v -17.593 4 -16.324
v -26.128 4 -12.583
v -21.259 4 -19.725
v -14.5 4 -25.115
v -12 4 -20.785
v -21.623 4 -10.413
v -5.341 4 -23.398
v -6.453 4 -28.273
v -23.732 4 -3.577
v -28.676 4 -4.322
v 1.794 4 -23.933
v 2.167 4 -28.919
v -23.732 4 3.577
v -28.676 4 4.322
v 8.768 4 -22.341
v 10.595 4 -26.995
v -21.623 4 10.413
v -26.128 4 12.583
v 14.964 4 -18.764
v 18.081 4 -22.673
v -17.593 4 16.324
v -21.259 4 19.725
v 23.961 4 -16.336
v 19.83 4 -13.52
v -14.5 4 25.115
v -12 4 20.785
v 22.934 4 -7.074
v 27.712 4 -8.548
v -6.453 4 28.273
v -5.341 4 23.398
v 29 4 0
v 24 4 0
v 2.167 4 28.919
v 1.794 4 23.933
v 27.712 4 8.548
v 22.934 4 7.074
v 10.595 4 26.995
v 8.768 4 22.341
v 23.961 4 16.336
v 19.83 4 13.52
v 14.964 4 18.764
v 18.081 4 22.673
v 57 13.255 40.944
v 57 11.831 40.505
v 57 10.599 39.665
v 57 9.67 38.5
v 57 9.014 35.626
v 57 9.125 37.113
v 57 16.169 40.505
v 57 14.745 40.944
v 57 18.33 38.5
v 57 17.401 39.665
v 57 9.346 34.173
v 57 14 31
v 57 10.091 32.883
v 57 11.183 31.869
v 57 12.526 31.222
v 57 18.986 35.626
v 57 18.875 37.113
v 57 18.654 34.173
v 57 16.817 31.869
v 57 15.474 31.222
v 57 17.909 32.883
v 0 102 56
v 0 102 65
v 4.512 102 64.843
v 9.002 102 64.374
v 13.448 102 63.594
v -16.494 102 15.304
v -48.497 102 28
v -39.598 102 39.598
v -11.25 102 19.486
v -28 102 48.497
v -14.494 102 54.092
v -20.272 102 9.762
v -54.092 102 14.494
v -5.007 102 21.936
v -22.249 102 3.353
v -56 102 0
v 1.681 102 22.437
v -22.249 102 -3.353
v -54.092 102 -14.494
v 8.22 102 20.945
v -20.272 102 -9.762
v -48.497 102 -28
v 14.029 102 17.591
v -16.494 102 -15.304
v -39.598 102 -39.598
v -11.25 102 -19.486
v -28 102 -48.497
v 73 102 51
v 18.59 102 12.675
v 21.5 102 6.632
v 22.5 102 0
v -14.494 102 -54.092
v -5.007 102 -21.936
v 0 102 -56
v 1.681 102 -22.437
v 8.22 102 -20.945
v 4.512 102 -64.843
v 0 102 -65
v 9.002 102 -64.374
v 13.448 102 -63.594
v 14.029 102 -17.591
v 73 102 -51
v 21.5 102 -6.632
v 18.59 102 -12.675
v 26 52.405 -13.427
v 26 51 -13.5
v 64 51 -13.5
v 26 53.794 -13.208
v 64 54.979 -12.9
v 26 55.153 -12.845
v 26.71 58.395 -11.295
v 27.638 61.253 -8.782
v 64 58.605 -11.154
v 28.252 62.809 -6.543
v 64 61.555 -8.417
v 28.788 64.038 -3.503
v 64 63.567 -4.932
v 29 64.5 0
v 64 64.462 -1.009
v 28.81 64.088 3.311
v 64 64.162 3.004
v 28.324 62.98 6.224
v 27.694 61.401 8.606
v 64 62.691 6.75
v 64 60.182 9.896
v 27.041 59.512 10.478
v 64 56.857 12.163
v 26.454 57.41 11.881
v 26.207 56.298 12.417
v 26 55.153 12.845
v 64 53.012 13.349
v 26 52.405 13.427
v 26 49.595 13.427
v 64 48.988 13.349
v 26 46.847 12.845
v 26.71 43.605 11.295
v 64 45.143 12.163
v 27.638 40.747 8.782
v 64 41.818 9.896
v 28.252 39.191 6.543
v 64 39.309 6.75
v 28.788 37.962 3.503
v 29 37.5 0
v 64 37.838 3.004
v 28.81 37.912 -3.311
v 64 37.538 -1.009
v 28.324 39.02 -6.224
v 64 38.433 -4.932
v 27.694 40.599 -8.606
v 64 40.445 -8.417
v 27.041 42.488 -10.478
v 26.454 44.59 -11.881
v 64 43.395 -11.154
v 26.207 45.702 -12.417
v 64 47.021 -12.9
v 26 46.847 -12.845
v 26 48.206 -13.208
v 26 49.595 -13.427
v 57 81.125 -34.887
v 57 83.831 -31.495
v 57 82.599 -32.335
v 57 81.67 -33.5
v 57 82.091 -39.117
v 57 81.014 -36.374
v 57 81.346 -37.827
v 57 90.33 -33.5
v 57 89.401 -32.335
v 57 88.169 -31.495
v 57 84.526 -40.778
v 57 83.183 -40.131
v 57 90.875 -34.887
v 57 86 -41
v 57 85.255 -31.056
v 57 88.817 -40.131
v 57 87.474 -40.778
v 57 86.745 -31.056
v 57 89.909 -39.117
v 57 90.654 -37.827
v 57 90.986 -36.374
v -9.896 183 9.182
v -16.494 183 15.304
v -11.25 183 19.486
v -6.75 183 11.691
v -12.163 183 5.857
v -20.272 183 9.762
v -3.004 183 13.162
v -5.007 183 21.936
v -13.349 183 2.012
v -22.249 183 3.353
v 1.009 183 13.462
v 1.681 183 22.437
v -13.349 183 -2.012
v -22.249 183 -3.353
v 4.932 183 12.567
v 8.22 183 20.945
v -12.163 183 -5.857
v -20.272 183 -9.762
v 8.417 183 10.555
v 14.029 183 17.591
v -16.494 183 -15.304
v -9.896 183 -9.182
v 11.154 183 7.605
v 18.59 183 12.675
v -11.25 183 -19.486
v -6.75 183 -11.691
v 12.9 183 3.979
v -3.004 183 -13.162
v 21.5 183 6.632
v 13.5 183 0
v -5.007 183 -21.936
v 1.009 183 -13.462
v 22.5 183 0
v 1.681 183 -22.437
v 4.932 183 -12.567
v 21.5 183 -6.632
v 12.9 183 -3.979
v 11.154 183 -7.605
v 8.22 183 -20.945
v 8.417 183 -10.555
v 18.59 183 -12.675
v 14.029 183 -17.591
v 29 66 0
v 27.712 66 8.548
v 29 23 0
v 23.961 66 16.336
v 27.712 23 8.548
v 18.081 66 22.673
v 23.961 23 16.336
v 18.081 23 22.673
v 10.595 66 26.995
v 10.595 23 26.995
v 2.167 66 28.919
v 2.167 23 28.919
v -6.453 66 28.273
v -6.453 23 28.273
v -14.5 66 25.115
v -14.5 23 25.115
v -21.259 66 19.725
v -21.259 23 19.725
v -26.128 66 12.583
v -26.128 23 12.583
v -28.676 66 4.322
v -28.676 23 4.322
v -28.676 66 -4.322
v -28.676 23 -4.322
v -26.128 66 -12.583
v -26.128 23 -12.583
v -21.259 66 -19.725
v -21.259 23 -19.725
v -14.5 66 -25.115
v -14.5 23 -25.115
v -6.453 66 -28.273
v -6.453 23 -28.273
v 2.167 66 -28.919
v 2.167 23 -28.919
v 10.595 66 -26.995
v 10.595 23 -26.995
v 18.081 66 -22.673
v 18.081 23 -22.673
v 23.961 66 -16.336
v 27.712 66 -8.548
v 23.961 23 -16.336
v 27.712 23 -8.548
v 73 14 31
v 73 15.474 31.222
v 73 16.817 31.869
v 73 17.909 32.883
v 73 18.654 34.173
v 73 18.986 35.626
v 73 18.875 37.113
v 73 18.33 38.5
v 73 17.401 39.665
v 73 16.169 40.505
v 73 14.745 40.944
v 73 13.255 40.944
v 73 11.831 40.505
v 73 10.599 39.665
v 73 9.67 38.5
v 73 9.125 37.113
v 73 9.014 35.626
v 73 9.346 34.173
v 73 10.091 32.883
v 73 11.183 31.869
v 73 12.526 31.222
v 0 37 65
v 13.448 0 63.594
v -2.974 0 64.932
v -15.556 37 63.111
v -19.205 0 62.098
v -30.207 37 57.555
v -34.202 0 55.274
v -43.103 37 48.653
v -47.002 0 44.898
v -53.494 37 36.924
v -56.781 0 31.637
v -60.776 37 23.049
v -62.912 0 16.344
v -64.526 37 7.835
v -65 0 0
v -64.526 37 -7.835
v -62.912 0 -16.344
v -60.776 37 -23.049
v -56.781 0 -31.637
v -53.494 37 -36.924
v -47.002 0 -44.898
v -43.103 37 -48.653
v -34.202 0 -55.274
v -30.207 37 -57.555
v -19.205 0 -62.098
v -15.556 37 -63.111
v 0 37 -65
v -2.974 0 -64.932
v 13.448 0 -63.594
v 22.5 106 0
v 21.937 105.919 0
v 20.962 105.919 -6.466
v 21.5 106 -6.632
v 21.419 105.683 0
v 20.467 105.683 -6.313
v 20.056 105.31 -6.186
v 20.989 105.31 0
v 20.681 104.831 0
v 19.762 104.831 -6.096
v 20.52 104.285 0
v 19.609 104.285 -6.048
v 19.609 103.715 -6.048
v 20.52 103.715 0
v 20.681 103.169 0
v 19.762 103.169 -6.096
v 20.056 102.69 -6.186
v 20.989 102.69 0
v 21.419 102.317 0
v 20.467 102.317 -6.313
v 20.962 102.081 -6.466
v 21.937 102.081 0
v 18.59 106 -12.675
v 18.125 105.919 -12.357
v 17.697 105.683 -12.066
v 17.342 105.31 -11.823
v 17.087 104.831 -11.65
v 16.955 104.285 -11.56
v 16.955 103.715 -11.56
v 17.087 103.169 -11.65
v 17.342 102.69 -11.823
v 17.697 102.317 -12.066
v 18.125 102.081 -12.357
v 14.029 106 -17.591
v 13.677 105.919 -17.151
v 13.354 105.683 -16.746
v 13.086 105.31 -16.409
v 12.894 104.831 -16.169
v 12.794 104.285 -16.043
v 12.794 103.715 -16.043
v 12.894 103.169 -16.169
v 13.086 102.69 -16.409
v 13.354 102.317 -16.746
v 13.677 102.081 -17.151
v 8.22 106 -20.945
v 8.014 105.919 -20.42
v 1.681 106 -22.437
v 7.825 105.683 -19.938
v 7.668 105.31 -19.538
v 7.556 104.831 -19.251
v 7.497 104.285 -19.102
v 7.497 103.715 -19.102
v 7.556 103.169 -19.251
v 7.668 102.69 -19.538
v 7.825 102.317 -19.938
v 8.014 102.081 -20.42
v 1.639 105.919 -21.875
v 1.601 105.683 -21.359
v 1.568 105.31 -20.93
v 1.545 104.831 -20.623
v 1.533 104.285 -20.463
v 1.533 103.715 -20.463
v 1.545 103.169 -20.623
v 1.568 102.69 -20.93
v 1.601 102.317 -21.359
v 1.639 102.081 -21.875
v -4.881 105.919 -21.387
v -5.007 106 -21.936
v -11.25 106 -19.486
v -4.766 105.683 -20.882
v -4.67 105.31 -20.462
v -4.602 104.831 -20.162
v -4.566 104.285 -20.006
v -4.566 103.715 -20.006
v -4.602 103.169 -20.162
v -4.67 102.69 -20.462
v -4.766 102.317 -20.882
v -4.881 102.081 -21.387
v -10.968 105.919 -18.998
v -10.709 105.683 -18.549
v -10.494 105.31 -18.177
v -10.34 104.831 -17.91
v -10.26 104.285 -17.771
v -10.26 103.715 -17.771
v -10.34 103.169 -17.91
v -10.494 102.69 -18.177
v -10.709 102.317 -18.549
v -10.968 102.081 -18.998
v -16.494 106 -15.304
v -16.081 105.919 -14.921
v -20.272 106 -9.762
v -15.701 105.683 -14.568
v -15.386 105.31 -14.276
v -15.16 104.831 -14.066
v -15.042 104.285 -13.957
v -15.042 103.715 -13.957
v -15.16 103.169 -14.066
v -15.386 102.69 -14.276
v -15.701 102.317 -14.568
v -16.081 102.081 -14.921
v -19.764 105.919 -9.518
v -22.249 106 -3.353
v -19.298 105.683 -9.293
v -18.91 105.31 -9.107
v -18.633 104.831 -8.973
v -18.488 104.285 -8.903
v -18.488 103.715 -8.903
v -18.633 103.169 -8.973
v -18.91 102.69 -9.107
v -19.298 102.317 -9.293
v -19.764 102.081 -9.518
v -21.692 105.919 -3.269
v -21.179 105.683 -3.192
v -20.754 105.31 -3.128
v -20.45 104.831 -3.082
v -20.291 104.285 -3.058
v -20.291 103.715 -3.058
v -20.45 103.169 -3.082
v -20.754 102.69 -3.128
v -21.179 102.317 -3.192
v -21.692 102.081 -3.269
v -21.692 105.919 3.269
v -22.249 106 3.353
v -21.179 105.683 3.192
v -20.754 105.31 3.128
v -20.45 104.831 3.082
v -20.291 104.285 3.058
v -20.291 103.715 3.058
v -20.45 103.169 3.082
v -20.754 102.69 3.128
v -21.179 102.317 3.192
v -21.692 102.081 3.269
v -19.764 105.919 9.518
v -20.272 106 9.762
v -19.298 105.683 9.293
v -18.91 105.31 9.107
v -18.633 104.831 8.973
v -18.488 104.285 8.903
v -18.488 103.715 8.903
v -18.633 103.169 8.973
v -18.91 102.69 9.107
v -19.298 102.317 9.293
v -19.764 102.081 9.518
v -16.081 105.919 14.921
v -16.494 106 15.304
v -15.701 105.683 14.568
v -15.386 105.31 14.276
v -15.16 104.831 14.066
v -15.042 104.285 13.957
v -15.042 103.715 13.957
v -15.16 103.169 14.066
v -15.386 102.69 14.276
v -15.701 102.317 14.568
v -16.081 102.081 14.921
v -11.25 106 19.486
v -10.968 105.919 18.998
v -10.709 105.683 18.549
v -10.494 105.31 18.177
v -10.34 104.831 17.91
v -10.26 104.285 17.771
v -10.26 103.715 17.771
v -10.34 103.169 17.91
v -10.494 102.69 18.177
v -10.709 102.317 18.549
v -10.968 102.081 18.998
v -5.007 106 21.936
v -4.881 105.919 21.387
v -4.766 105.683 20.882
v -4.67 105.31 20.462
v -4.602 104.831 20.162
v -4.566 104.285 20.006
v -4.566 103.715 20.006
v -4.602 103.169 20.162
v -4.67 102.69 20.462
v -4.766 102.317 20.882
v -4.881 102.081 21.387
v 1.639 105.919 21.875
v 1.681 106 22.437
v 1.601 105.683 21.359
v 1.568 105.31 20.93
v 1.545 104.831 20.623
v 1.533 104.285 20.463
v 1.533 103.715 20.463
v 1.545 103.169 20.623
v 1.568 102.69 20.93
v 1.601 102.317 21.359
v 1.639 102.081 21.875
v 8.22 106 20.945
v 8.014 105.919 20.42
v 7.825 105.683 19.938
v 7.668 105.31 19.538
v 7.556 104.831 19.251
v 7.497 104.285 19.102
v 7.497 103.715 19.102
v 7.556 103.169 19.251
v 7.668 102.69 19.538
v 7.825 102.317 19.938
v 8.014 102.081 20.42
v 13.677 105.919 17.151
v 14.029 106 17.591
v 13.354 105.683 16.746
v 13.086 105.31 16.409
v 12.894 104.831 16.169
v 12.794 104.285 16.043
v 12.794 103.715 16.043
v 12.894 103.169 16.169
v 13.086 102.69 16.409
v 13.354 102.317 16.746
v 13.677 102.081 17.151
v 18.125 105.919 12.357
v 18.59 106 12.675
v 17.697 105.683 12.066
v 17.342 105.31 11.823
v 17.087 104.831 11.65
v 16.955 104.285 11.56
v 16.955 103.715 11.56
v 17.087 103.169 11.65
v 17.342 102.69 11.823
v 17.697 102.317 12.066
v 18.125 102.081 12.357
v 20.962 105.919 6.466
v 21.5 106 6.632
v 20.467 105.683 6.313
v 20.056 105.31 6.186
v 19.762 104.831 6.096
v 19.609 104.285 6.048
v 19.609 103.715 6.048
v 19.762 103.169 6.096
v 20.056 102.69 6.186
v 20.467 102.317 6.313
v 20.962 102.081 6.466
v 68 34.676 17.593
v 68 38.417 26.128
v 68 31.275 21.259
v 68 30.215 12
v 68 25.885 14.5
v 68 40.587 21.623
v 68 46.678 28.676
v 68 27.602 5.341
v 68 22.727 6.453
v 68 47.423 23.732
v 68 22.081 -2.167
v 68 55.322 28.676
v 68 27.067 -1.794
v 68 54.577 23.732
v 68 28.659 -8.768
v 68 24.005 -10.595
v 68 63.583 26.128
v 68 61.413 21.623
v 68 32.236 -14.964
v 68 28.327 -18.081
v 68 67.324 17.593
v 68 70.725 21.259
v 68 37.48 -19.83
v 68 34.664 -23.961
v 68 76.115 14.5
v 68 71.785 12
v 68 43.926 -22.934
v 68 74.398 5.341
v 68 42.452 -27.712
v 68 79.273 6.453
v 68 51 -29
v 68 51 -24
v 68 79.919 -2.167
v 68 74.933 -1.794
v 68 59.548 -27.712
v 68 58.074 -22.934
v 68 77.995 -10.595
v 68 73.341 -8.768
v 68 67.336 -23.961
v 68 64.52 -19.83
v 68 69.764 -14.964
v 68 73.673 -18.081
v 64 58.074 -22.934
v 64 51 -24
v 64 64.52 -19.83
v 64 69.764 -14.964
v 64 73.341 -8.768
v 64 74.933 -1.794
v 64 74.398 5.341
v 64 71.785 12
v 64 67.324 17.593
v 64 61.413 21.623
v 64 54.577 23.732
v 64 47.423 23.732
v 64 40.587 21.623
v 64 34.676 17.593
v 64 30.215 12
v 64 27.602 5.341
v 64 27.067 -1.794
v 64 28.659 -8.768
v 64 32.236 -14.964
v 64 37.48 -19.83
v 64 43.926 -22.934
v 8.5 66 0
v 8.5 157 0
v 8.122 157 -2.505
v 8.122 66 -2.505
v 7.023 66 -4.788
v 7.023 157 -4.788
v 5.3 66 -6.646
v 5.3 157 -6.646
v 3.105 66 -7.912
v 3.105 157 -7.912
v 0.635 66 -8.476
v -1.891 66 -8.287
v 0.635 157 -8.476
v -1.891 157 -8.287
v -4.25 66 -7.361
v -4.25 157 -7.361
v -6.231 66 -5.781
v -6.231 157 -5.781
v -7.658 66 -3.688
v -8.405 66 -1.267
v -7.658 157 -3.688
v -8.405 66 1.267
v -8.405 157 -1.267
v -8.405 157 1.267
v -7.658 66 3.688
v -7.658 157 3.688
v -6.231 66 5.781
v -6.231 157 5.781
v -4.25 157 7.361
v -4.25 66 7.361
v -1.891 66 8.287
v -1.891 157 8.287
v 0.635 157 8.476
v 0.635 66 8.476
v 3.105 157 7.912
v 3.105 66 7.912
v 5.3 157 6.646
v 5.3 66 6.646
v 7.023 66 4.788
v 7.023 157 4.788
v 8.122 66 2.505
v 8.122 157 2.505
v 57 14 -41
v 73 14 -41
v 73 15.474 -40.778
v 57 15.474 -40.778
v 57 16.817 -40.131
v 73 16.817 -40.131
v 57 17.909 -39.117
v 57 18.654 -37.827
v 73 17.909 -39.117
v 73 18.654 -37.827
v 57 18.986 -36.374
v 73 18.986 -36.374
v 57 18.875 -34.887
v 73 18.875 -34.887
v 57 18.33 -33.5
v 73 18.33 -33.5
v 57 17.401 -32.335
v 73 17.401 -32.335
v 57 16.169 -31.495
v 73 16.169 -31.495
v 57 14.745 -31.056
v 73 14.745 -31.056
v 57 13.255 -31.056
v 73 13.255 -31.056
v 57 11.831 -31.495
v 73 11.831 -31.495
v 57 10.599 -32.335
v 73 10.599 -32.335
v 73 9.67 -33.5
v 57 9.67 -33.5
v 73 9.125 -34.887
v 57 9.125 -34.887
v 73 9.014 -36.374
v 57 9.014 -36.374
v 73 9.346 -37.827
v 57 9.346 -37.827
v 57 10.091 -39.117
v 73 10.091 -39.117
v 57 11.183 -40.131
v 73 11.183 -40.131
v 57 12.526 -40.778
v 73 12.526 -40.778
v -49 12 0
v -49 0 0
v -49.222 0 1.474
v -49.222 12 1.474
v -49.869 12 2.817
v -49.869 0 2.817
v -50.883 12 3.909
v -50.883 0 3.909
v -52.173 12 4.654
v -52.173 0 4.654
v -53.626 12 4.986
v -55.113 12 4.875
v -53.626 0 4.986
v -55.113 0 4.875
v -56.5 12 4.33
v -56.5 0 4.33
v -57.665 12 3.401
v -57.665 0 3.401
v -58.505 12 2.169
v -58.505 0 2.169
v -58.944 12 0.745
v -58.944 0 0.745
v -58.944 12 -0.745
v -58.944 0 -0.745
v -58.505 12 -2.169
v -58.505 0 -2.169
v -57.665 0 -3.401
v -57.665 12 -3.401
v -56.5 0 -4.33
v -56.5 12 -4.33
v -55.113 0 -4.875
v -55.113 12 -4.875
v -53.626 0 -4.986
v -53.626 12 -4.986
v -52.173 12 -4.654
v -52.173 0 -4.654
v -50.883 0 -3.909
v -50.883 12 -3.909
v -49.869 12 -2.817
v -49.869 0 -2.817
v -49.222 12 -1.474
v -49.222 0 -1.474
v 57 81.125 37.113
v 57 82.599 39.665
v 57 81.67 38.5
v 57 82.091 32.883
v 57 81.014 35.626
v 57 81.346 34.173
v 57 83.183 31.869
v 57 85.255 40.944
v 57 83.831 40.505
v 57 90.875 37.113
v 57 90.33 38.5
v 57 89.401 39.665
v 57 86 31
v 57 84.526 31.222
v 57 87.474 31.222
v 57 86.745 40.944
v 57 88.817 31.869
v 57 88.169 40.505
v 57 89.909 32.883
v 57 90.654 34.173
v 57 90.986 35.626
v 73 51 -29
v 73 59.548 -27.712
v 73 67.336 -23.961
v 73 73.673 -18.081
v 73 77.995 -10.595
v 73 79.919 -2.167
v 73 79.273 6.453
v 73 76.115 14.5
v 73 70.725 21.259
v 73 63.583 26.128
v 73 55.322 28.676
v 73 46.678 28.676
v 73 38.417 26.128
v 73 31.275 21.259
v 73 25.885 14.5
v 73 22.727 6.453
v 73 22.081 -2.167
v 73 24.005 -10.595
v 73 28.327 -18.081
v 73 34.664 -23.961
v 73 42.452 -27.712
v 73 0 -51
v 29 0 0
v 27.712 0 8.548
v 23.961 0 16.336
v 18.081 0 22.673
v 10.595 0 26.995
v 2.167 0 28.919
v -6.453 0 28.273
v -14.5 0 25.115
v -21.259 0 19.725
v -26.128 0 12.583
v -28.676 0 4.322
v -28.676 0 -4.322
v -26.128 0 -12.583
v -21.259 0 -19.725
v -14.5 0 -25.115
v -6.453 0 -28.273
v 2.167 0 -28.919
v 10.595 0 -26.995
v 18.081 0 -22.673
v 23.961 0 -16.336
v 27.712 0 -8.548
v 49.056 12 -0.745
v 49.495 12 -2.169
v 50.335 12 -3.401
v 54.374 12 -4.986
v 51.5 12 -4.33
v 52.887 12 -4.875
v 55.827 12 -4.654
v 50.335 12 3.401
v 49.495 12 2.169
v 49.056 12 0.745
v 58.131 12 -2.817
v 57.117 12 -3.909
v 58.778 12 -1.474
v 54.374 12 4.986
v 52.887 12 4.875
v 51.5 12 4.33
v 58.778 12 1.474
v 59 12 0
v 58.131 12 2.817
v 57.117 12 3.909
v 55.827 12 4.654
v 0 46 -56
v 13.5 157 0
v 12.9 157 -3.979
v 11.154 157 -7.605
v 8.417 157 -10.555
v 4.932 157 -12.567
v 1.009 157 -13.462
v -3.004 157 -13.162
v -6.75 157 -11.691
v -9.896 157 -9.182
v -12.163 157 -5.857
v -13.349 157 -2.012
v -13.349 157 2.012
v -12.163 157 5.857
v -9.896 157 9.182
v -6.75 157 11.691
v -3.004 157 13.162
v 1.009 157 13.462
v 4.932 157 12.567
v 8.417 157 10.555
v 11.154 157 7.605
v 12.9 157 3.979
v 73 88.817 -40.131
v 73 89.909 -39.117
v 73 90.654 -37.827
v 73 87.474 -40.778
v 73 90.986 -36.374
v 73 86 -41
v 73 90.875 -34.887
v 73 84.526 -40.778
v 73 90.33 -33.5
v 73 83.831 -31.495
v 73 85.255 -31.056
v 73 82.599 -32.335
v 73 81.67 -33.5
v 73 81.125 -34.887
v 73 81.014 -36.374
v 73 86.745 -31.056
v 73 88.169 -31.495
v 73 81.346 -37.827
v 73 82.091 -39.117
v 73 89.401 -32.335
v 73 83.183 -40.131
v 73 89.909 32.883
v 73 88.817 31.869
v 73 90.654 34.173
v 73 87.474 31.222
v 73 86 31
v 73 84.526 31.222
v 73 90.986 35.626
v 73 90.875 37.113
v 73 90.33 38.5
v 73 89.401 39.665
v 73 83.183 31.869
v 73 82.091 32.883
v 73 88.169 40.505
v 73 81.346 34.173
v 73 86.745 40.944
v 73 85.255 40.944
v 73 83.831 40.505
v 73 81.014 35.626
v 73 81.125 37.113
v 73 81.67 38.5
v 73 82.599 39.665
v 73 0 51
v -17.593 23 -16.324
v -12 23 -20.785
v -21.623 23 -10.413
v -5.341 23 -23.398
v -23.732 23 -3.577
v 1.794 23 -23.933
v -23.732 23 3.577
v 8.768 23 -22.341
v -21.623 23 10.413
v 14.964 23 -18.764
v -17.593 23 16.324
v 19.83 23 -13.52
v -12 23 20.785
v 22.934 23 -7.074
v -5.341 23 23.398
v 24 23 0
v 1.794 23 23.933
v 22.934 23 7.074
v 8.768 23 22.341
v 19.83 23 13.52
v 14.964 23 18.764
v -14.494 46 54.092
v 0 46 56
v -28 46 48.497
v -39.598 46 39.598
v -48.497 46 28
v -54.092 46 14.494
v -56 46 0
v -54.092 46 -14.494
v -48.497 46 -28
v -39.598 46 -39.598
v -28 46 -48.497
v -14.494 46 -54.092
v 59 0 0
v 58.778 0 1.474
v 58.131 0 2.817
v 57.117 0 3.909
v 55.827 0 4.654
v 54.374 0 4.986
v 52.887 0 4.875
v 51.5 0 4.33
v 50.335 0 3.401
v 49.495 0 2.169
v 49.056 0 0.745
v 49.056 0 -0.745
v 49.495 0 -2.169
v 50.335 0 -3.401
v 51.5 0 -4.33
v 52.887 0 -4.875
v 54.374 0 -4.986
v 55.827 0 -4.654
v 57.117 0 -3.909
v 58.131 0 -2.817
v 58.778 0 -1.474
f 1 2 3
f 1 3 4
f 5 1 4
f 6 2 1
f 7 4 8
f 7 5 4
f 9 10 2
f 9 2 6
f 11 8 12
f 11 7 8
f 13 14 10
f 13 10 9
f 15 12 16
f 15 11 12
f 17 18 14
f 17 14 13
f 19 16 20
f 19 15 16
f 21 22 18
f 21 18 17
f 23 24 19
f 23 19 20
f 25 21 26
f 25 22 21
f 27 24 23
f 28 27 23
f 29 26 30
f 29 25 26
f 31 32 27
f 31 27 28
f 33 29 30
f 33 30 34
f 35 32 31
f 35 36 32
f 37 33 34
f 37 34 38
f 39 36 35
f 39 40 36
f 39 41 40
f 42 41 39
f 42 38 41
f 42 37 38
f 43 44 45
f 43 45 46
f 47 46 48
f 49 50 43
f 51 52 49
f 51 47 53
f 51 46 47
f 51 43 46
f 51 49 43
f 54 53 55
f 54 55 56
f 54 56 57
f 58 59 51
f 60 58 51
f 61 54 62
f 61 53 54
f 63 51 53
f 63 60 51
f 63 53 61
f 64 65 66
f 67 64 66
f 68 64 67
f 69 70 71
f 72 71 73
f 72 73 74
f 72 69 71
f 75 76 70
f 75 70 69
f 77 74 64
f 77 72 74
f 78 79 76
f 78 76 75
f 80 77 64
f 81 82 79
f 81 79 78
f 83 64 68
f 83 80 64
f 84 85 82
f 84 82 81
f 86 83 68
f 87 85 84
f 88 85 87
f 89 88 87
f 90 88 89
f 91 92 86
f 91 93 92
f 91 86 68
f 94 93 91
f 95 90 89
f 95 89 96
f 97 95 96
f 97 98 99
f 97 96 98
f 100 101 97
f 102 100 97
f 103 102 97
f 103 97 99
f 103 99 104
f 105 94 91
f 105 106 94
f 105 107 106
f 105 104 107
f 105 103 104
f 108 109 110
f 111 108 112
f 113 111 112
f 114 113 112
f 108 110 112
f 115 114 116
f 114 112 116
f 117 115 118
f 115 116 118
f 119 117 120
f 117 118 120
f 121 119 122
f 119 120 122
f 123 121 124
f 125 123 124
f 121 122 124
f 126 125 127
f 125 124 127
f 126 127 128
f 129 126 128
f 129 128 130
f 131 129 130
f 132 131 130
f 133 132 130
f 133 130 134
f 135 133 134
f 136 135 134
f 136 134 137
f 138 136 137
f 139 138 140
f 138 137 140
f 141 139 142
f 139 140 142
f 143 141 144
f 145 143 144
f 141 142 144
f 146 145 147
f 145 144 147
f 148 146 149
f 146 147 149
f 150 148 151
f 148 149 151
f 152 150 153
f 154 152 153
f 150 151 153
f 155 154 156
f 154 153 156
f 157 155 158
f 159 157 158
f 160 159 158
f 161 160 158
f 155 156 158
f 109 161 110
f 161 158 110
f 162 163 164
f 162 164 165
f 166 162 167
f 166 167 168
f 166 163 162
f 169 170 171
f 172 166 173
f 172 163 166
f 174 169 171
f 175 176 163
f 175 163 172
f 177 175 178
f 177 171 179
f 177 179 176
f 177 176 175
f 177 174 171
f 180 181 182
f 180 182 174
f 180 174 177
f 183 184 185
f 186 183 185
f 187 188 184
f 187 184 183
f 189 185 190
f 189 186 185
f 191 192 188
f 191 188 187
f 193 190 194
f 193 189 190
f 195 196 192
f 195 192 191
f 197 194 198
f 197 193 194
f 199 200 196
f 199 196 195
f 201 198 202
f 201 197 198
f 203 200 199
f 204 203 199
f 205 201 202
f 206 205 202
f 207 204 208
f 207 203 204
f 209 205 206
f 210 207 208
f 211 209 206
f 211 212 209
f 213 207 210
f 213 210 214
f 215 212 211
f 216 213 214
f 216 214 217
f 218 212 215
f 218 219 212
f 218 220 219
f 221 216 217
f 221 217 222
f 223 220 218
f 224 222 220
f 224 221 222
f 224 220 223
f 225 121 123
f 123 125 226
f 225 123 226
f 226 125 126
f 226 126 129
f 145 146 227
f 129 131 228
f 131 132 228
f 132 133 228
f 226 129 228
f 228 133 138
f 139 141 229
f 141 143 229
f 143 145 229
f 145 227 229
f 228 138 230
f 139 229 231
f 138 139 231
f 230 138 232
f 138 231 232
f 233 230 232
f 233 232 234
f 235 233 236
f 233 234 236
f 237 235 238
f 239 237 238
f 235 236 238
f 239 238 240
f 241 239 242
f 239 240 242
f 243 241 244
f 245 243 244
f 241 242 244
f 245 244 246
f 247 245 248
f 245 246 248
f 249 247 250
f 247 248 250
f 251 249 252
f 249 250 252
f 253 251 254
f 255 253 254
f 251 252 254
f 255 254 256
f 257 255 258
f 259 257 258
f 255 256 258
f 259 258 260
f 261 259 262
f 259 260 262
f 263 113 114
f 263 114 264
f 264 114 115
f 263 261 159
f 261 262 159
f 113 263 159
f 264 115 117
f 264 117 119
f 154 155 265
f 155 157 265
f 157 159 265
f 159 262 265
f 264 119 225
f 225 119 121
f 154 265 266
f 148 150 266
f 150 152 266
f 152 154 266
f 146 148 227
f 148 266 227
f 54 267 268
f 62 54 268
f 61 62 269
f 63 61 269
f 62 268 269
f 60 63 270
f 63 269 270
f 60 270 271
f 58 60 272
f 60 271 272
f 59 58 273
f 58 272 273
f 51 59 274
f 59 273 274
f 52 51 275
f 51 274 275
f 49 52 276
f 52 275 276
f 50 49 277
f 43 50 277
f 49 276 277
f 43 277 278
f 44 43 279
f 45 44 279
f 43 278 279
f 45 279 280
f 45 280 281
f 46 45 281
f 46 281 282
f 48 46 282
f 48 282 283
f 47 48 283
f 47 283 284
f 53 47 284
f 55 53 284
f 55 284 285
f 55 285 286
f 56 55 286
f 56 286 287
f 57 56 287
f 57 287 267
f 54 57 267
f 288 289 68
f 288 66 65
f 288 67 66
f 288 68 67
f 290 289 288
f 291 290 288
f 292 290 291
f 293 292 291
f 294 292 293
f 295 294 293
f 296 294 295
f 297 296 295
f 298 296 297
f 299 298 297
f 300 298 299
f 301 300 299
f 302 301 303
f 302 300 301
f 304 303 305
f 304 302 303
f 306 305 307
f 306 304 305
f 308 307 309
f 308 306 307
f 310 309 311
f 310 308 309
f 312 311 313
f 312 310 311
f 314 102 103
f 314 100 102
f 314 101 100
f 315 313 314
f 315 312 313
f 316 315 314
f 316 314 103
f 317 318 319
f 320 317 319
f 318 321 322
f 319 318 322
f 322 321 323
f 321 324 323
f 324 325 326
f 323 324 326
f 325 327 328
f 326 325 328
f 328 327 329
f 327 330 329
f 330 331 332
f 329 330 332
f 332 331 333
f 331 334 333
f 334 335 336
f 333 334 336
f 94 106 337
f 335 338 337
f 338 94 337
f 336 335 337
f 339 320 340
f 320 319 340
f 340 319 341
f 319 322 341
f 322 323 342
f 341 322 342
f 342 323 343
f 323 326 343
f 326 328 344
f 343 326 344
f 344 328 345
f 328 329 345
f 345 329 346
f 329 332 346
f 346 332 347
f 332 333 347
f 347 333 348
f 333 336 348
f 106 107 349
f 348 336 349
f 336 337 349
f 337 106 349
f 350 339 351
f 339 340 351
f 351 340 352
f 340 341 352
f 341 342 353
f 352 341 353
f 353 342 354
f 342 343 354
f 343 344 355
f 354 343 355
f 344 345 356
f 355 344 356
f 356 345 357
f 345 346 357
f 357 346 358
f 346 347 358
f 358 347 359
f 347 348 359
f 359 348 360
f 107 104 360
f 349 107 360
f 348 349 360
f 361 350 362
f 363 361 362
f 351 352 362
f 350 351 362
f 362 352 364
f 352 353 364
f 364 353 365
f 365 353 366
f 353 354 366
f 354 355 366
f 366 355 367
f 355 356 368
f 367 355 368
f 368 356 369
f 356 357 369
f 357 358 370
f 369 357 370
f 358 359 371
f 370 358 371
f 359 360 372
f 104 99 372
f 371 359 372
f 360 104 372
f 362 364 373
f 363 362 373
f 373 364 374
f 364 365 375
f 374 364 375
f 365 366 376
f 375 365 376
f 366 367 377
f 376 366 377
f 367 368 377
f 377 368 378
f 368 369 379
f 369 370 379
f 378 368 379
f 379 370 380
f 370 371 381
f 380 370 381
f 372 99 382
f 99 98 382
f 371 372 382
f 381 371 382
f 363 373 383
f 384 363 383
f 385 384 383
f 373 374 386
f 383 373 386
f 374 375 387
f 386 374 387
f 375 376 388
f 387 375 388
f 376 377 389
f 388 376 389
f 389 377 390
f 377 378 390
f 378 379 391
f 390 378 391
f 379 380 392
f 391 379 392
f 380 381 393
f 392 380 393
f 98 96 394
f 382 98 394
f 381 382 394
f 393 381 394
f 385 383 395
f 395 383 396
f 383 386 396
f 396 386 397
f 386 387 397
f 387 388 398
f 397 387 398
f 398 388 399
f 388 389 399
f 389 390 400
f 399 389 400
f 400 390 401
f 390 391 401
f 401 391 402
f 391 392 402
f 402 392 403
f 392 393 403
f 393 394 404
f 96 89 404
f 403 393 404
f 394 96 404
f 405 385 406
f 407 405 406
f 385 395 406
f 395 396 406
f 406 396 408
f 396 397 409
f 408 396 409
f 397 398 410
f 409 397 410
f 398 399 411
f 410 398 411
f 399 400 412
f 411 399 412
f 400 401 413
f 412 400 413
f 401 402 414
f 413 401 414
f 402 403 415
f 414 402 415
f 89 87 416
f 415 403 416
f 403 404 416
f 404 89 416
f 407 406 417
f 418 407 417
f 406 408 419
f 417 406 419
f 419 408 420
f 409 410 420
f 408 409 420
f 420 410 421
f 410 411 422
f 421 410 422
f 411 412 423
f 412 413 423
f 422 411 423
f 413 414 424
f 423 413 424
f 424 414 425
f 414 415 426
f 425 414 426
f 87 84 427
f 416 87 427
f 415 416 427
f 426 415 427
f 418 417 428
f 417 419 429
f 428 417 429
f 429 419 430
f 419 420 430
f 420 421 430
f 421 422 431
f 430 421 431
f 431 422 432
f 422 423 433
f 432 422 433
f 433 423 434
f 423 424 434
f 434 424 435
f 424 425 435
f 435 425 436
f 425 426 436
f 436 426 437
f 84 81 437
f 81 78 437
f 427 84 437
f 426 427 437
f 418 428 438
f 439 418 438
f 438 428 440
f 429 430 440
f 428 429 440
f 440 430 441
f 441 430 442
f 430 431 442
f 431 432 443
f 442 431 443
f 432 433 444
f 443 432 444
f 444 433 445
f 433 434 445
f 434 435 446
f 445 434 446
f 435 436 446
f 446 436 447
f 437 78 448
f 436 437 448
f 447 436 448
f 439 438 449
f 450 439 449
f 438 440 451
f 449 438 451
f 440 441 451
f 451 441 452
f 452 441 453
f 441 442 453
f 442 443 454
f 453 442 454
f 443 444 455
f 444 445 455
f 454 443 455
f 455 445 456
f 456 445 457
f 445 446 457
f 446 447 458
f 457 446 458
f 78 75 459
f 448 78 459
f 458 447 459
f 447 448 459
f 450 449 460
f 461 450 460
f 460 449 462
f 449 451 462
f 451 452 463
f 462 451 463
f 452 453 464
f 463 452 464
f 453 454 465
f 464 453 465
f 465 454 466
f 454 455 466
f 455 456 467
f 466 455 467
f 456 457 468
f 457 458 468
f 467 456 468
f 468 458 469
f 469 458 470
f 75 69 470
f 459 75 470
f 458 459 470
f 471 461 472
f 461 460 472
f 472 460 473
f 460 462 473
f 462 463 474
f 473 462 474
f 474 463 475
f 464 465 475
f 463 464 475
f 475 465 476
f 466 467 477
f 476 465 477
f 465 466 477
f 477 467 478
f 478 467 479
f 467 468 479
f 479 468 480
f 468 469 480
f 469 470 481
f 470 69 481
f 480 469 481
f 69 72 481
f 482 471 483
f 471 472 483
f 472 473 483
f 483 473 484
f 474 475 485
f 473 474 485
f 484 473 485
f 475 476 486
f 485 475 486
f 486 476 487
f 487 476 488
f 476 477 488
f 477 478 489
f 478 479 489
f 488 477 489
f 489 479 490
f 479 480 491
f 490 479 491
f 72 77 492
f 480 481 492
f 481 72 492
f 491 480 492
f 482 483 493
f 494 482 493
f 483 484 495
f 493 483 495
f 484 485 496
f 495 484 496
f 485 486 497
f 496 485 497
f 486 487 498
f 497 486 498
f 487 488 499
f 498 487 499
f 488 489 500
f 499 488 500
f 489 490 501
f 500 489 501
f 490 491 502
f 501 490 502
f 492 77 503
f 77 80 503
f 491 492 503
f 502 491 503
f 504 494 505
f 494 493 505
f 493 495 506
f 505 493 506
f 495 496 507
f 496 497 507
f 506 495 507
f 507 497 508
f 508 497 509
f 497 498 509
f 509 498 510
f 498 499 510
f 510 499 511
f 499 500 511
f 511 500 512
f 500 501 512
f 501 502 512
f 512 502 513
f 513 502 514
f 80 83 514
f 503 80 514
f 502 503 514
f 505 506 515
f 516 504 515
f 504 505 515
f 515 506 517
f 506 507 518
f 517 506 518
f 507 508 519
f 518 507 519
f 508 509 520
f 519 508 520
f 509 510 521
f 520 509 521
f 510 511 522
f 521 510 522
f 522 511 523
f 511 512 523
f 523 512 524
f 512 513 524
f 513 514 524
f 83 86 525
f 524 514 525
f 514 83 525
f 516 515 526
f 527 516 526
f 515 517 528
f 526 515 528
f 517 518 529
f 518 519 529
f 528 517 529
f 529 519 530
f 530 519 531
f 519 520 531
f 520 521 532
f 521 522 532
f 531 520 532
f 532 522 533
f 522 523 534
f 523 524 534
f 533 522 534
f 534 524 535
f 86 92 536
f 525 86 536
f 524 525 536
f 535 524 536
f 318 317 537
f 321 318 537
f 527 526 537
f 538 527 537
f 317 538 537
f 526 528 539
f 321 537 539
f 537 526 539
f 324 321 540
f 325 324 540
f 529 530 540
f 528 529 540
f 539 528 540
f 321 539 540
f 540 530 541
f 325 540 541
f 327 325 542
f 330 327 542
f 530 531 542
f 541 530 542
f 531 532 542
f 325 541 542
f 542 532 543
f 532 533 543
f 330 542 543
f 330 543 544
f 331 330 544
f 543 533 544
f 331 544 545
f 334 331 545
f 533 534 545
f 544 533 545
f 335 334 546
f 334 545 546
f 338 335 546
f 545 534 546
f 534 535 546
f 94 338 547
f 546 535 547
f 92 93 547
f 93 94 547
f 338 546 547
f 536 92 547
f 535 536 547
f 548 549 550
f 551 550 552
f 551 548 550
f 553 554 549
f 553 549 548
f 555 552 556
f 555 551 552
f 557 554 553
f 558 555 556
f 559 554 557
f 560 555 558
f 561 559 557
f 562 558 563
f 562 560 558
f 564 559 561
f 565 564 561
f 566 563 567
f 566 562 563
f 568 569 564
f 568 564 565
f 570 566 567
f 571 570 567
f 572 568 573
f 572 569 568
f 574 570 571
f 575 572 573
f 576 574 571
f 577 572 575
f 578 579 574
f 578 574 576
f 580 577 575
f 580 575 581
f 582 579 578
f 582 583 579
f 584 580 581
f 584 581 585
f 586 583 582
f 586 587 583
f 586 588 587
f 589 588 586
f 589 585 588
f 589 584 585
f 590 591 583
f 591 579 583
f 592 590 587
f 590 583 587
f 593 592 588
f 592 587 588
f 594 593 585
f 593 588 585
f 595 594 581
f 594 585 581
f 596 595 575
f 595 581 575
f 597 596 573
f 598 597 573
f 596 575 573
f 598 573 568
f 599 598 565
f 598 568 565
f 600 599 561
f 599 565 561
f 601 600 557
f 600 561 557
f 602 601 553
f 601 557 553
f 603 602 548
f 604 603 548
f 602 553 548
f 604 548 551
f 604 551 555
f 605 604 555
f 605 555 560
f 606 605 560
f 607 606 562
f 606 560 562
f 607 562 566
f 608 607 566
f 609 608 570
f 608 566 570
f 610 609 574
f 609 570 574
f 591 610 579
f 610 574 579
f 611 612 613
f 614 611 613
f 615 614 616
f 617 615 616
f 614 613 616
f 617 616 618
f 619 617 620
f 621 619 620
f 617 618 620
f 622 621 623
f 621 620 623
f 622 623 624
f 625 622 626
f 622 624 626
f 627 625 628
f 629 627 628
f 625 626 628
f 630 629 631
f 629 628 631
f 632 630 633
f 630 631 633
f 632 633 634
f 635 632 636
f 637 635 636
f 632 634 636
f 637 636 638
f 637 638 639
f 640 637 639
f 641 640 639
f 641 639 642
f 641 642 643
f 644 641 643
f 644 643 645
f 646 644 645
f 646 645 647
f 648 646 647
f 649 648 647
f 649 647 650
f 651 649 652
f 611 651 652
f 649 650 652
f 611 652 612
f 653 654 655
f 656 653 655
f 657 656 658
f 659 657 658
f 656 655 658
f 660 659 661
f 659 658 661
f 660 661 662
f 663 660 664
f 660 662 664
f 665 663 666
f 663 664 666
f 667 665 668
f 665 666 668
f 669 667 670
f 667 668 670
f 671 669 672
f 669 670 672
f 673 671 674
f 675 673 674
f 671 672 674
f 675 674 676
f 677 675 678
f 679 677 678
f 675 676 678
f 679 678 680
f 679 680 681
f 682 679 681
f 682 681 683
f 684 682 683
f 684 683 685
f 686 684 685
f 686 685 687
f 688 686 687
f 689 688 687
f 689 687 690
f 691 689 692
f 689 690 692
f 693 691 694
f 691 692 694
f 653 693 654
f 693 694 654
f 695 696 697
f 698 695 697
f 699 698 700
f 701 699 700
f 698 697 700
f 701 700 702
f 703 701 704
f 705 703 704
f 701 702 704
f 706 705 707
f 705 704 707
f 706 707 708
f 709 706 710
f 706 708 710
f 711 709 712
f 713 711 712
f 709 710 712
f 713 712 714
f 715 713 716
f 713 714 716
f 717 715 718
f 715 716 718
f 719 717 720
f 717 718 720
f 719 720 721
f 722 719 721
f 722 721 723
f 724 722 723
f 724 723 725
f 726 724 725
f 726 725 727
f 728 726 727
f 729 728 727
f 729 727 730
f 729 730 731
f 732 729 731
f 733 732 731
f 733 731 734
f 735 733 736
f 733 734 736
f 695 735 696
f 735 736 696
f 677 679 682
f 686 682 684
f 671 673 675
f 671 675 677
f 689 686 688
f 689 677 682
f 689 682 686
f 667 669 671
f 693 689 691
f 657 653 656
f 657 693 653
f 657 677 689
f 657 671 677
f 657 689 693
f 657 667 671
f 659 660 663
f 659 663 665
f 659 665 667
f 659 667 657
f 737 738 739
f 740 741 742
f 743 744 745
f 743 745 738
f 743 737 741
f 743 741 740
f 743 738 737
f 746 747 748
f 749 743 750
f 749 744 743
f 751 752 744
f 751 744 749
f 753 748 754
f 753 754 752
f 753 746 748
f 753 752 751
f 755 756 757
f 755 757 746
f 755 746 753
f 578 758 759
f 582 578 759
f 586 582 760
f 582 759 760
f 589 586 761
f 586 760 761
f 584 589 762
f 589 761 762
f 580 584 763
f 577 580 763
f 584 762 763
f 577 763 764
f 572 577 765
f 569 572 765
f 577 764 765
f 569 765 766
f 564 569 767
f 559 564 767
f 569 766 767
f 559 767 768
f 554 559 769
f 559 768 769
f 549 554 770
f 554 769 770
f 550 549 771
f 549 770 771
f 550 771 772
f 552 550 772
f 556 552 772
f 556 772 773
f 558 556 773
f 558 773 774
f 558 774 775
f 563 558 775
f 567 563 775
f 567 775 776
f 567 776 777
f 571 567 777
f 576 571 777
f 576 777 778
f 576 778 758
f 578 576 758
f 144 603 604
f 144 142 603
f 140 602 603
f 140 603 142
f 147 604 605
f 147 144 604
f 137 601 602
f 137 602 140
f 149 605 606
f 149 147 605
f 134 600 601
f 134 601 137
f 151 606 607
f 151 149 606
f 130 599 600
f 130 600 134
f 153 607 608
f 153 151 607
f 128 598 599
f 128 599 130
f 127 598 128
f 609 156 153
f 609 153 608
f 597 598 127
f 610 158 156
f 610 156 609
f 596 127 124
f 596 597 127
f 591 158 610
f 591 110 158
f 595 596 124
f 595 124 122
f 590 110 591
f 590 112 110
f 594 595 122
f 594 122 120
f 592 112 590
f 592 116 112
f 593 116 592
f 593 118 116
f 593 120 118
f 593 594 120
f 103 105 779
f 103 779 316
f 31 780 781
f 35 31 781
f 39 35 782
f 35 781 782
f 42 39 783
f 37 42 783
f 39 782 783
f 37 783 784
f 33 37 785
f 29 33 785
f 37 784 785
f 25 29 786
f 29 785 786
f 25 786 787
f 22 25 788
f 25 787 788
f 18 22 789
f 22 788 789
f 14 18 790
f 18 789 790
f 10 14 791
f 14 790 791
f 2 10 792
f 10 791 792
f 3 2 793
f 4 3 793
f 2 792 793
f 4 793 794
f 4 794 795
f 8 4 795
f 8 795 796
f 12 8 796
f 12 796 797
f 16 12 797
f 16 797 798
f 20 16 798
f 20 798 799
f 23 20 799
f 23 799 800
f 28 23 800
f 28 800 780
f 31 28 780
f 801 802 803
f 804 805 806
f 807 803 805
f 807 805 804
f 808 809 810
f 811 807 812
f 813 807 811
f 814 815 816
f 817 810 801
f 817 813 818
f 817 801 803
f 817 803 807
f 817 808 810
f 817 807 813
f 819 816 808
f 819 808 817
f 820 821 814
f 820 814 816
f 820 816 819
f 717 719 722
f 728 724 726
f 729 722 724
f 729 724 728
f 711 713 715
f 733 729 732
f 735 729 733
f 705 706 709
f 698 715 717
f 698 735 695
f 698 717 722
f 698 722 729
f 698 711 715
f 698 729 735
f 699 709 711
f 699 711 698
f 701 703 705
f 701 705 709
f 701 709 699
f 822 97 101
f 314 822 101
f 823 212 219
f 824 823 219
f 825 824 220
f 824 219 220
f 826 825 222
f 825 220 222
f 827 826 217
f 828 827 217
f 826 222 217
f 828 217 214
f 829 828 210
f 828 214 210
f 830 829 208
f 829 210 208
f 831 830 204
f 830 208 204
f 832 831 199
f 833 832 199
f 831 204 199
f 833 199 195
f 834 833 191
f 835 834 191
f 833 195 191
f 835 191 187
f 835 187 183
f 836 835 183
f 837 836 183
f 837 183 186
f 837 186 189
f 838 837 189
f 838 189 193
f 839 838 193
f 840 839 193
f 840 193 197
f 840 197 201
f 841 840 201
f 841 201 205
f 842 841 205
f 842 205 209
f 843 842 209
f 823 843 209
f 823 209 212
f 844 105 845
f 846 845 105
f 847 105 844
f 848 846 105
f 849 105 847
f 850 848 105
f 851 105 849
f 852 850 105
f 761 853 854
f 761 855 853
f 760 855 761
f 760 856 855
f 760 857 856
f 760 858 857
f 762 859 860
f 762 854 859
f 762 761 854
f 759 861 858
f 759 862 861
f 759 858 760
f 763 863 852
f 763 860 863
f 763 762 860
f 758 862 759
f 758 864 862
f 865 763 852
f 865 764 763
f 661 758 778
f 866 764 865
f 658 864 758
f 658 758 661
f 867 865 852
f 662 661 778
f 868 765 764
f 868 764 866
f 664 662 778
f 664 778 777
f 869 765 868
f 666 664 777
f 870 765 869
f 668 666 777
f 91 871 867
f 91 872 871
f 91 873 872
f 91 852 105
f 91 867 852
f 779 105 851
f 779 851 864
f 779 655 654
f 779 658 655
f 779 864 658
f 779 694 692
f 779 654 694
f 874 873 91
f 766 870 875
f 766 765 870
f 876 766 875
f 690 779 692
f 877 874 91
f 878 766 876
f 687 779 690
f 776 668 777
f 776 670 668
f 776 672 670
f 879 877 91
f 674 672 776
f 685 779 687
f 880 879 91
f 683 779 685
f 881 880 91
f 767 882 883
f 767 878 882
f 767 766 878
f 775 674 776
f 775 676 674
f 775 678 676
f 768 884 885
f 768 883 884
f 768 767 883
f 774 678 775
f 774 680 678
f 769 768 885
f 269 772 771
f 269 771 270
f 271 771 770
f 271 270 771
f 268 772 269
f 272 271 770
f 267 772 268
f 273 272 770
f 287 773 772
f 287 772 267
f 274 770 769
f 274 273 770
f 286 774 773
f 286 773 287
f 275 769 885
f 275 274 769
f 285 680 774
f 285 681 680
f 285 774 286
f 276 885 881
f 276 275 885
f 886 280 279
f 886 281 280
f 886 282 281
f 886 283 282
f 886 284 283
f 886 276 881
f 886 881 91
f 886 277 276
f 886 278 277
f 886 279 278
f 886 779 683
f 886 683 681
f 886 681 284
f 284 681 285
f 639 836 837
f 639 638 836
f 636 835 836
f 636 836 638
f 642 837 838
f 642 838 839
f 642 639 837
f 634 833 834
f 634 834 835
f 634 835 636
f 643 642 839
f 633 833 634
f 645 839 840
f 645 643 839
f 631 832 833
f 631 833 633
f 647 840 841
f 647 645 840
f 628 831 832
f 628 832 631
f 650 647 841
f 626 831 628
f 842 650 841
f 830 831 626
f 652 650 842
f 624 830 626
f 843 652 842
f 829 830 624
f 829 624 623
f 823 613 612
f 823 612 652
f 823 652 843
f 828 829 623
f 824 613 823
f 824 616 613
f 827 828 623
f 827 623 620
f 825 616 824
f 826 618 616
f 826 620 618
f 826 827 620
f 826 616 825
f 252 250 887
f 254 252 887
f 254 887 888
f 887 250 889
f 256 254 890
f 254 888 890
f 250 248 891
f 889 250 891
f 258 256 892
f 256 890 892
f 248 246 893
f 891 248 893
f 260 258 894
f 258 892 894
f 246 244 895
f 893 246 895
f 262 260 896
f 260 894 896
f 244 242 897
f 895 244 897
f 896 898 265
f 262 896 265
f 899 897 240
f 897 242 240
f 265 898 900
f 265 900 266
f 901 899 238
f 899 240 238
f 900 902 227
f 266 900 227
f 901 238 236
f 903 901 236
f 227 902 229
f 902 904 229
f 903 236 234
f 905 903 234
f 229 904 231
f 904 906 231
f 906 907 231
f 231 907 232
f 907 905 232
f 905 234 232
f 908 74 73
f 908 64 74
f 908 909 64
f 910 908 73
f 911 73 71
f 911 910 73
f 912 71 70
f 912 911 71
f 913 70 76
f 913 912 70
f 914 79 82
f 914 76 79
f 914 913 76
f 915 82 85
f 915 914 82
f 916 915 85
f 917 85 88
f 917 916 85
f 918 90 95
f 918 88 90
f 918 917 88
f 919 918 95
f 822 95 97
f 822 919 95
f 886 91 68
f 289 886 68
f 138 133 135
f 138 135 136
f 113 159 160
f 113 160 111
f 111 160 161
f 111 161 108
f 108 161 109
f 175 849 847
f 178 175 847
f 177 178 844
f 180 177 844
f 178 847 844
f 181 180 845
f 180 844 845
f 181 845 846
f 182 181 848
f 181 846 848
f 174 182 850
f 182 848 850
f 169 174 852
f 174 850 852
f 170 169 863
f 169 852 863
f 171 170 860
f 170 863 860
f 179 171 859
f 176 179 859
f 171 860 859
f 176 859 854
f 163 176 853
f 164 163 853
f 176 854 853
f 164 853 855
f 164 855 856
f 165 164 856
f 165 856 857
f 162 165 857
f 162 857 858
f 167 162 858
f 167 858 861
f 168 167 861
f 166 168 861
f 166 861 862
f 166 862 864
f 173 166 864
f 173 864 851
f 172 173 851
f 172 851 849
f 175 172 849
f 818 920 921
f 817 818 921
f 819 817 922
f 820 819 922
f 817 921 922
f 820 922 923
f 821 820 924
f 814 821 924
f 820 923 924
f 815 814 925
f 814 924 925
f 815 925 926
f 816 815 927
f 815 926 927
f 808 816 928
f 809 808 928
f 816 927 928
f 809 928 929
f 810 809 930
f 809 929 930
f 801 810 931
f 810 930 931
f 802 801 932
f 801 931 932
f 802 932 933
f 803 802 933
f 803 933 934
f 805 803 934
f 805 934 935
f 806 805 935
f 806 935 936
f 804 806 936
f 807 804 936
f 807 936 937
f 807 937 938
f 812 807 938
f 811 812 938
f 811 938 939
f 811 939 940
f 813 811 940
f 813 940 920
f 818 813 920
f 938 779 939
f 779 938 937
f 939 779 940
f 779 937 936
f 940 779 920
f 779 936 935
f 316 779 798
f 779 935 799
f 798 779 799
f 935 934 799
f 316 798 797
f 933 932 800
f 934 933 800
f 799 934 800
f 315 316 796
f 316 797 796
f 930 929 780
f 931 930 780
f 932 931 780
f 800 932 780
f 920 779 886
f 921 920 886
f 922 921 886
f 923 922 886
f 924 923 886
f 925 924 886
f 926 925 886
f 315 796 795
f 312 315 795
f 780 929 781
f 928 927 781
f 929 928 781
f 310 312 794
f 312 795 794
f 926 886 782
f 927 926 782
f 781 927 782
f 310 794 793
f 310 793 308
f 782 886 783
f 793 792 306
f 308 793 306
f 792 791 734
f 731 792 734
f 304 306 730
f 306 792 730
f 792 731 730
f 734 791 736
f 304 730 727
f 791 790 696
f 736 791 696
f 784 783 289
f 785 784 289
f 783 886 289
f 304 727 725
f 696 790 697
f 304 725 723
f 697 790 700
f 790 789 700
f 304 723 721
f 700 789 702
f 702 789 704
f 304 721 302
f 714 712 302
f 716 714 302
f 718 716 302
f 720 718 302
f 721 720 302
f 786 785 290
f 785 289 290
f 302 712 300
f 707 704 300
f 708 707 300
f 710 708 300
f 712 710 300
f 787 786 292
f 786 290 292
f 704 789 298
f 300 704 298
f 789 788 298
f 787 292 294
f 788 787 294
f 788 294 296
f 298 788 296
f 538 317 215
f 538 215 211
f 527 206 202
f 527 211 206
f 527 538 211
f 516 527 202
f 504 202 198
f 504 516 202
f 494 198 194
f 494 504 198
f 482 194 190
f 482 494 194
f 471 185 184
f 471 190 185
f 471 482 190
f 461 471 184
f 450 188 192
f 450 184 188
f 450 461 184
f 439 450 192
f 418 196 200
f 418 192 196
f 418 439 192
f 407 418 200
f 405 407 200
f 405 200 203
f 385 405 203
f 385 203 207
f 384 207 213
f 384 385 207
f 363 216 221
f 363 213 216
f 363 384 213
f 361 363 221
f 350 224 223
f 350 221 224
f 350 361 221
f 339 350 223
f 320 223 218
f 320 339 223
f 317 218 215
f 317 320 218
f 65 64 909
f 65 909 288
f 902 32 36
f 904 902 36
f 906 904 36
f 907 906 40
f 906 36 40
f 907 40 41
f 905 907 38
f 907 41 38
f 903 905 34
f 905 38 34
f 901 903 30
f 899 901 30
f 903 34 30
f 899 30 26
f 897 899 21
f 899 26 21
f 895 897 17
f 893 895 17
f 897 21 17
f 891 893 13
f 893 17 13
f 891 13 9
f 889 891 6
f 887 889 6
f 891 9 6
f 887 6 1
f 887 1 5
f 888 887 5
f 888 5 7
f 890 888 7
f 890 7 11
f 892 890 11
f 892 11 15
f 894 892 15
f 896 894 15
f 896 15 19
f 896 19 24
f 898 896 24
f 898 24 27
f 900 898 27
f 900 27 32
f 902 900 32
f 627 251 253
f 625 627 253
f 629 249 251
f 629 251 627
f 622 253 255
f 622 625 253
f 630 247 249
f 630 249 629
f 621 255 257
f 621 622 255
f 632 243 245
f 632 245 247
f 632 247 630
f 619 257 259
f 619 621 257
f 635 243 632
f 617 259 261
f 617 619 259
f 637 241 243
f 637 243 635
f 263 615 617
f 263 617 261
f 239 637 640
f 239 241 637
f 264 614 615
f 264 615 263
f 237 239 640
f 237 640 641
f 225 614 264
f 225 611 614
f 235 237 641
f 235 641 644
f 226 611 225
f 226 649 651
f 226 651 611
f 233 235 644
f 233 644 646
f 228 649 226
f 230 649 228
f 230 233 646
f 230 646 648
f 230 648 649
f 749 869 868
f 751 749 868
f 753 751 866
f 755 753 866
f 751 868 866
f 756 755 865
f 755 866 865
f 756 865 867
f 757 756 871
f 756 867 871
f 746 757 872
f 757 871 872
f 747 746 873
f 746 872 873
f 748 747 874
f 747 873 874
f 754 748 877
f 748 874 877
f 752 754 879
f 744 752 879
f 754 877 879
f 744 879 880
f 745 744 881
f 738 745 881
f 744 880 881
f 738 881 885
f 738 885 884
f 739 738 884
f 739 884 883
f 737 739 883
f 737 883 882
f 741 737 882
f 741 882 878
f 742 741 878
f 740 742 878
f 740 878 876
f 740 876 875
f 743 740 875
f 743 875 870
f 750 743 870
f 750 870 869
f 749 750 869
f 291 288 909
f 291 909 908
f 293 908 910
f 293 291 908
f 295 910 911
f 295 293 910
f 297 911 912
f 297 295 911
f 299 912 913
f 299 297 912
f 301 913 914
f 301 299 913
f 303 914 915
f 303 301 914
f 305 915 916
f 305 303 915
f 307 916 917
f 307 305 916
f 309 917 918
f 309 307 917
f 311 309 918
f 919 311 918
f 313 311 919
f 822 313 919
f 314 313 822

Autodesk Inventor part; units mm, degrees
ref_plane "YZ Plane" through (0, 0, 0) normal (1, 0, 0) x (0, 1, 0)
ref_plane "XZ Plane" through (0, 0, 0) normal (0, 1, 0) x (-1, 0, 0)
ref_plane "XY Plane" through (0, 0, 0) normal (0, 0, 1) x (1, 0, 0)
sketch "Sketch19" plane through (0, 0, 0) normal (0, 1, 0) x (-1, 0, 0)
  arc A0 (-13.4483, -63.5936) -> (-13.4483, 63.5936) centre (0, 0) ccw
  line L0 (-73, -51) -> (-73, 51)
  line L1 (-73, 51) -> (-13.4483, 63.5936)
  line L2 (-73, -51) -> (-13.4483, -63.5936)
  dimension "d91" = 130
  dimension "d93" = 102
extrude "Extrusion18" add sketch "Sketch19" along normal blind 37
sketch "Sketch20" plane through (0, 37, 0) normal (0, 1, 0) x (1, 0, 0)
  arc A0 (0, 56) -> (0, -56) centre (0, 0) ccw
  line L0 (0, -56) -> (0, -65)
  line L1 (0, 56) -> (0, 65)
  arc A1 (13.4483, 63.5936) -> (13.4483, -63.5936) centre (0, 0) ccw projected
  line L2 (13.4483, -63.5936) -> (73, -51) projected
  line L3 (73, -51) -> (73, 51) projected
  line L4 (73, 51) -> (13.4483, 63.5936) projected
  dimension "d96" = 112
extrude "Extrusion19" add sketch "Sketch20" along normal blind 65 contours L1 A1 L4 L3 L2 L0 A0
chamfer "Chamfer2" distance 9 angle 45 1 edges at (-56, 37, 0)
sketch "Sketch21" plane through (0, 0, 0) normal (0, -1, 0) x (1, 0, 0)
  circle A0 centre (0, 0) radius 29
  dimension "d102" = 58
extrude "Extrusion20" cut sketch "Sketch21" against normal blind 4
sketch "Sketch22" plane through (0, 4, 0) normal (0, -1, 0) x (1, 0, 0)
  circle A0 centre (0, 0) radius 24
  dimension "d105" = 48
extrude "Extrusion21" cut sketch "Sketch22" against normal blind 19
sketch "Sketch23" plane through (0, 0, 0) normal (0, -1, 0) x (1, 0, 0)
  circle A0 centre (-54, 0) radius 5
  circle A1 centre (54, 0) radius 5
  point P0 (0, 0)
  dimension "d109" = 10
  dimension "d110" = 10
extrude "Extrusion22" cut sketch "Sketch23" against normal blind 12
sketch "Sketch24" plane through (73, 0, 51) normal (1, 0, 0) x (0, 0, -1)
  line L0 (0, 102) -> (102, 102) projected
  line L1 (102, 0) -> (102, 102) projected
  line L2 (0, 0) -> (0, 102) projected
  line L3 (0, 0) -> (102, 0) projected
  circle A0 centre (51, 51) radius 29
  point P0 (51, 0)
  dimension "d113" = 58
extrude "Extrusion23" cut sketch "Sketch24" against normal blind 5 contours A0
sketch "Sketch25" plane through (68, 51, 0) normal (1, 0, 0) x (0, 0, -1)
  circle A0 centre (0, 0) radius 24
  point P0 (0, -51)
  dimension "d116" = 48
extrude "Extrusion24" cut sketch "Sketch25" against normal blind 4
sketch "Sketch26" plane through (64, 51, 0) normal (1, 0, 0) x (0, 0, -1)
  circle A0 centre (0, 0) radius 13.5
  point P0 (0, -51)
  dimension "d119" = 27
extrude "Extrusion25" cut sketch "Sketch26" against normal blind 38
sketch "Sketch27" plane through (73, 0, 51) normal (1, 0, 0) x (0, 0, -1)
  line L0 (15, 86) -> (87, 14) construction
  line L1 (87, 86) -> (15, 14) construction
  circle A0 centre (15, 86) radius 5
  circle A1 centre (87, 86) radius 5
  circle A2 centre (87, 14) radius 5
  circle A3 centre (15, 14) radius 5
  point P0 (51, 0)
  point P1 (51, 50)
  dimension "d125" = 72
  dimension "d126" = 72
  dimension "d127" = 10
  dimension "d128" = 10
  dimension "d129" = 10
  dimension "d130" = 10
extrude "Extrusion26" cut sketch "Sketch27" against normal blind 16
sketch "Sketch28" plane through (0, 102, 0) normal (0, 1, 0) x (1, 0, 0)
  circle A0 centre (0, 0) radius 22.5
  dimension "d133" = 45
extrude "Extrusion27" add sketch "Sketch28" along normal blind 81
sketch "Sketch29" plane through (0, 183, 0) normal (0, 1, 0) x (1, 0, 0)
  circle A0 centre (0, 0) radius 13.5
  dimension "d136" = 27
extrude "Extrusion28" cut sketch "Sketch29" against normal blind 26
sketch "Sketch30" plane through (0, 157, 0) normal (0, 1, 0) x (1, 0, 0)
  circle A0 centre (0, 0) radius 8.5
  dimension "d139" = 17
extrude "Extrusion29" cut sketch "Sketch30" against normal blind 91
sketch "Sketch31" plane through (0, 0, 0) normal (0, 0, 1) x (1, 0, 0)
  line L0 (22.5, 102) -> (22.5, 183) projected
  line L1 (22.5, 102) -> (22.5, 106)
  line L2 (22.5, 102) -> (26.5, 102) construction
  circle A0 centre (22.5, 104) radius 2
  line L3 (-92.6, 0) -> (100.6, 0) projected
  line L4 (0, -36.6) -> (0, 219.6) projected
  point P0 (0, 0)
  dimension "d142" = 4
  dimension "d143" = 90
revolve "Revolution1" cut sketch "Sketch31" angle 360 about axis through (0, -10, 0) along (0, 1, 0)
sketch "Sketch32" plane through (0, 23, 0) normal (0, -1, 0) x (1, 0, 0)
  circle A0 centre (0, 0) radius 29
  dimension "d146" = 58
extrude "Extrusion30" cut sketch "Sketch32" against normal blind 43
thread "Thread10" size "M20x2.5" class "6H" standard "ANSI Metric M Profile" full length
thread "Thread11" size "M12x1.75" class "6H" standard "ANSI Metric M Profile" full length
thread "Thread12" size "M12x1.75" class "6H" standard "ANSI Metric M Profile" full length
thread "Thread13" size "M12x1.75" class "6H" standard "ANSI Metric M Profile" full length
thread "Thread14" size "M12x1.75" class "6H" standard "ANSI Metric M Profile" full length
thread "Thread15" size "M45x4.5" class "6g" standard "ANSI Metric M Profile" full length
thread "Thread16" size "M12x1.75" class "6H" standard "ANSI Metric M Profile" full length
thread "Thread17" size "M12x1.75" class "6H" standard "ANSI Metric M Profile" full length
properties part number "00.32.001 \"Housing \"" material "Steel"
